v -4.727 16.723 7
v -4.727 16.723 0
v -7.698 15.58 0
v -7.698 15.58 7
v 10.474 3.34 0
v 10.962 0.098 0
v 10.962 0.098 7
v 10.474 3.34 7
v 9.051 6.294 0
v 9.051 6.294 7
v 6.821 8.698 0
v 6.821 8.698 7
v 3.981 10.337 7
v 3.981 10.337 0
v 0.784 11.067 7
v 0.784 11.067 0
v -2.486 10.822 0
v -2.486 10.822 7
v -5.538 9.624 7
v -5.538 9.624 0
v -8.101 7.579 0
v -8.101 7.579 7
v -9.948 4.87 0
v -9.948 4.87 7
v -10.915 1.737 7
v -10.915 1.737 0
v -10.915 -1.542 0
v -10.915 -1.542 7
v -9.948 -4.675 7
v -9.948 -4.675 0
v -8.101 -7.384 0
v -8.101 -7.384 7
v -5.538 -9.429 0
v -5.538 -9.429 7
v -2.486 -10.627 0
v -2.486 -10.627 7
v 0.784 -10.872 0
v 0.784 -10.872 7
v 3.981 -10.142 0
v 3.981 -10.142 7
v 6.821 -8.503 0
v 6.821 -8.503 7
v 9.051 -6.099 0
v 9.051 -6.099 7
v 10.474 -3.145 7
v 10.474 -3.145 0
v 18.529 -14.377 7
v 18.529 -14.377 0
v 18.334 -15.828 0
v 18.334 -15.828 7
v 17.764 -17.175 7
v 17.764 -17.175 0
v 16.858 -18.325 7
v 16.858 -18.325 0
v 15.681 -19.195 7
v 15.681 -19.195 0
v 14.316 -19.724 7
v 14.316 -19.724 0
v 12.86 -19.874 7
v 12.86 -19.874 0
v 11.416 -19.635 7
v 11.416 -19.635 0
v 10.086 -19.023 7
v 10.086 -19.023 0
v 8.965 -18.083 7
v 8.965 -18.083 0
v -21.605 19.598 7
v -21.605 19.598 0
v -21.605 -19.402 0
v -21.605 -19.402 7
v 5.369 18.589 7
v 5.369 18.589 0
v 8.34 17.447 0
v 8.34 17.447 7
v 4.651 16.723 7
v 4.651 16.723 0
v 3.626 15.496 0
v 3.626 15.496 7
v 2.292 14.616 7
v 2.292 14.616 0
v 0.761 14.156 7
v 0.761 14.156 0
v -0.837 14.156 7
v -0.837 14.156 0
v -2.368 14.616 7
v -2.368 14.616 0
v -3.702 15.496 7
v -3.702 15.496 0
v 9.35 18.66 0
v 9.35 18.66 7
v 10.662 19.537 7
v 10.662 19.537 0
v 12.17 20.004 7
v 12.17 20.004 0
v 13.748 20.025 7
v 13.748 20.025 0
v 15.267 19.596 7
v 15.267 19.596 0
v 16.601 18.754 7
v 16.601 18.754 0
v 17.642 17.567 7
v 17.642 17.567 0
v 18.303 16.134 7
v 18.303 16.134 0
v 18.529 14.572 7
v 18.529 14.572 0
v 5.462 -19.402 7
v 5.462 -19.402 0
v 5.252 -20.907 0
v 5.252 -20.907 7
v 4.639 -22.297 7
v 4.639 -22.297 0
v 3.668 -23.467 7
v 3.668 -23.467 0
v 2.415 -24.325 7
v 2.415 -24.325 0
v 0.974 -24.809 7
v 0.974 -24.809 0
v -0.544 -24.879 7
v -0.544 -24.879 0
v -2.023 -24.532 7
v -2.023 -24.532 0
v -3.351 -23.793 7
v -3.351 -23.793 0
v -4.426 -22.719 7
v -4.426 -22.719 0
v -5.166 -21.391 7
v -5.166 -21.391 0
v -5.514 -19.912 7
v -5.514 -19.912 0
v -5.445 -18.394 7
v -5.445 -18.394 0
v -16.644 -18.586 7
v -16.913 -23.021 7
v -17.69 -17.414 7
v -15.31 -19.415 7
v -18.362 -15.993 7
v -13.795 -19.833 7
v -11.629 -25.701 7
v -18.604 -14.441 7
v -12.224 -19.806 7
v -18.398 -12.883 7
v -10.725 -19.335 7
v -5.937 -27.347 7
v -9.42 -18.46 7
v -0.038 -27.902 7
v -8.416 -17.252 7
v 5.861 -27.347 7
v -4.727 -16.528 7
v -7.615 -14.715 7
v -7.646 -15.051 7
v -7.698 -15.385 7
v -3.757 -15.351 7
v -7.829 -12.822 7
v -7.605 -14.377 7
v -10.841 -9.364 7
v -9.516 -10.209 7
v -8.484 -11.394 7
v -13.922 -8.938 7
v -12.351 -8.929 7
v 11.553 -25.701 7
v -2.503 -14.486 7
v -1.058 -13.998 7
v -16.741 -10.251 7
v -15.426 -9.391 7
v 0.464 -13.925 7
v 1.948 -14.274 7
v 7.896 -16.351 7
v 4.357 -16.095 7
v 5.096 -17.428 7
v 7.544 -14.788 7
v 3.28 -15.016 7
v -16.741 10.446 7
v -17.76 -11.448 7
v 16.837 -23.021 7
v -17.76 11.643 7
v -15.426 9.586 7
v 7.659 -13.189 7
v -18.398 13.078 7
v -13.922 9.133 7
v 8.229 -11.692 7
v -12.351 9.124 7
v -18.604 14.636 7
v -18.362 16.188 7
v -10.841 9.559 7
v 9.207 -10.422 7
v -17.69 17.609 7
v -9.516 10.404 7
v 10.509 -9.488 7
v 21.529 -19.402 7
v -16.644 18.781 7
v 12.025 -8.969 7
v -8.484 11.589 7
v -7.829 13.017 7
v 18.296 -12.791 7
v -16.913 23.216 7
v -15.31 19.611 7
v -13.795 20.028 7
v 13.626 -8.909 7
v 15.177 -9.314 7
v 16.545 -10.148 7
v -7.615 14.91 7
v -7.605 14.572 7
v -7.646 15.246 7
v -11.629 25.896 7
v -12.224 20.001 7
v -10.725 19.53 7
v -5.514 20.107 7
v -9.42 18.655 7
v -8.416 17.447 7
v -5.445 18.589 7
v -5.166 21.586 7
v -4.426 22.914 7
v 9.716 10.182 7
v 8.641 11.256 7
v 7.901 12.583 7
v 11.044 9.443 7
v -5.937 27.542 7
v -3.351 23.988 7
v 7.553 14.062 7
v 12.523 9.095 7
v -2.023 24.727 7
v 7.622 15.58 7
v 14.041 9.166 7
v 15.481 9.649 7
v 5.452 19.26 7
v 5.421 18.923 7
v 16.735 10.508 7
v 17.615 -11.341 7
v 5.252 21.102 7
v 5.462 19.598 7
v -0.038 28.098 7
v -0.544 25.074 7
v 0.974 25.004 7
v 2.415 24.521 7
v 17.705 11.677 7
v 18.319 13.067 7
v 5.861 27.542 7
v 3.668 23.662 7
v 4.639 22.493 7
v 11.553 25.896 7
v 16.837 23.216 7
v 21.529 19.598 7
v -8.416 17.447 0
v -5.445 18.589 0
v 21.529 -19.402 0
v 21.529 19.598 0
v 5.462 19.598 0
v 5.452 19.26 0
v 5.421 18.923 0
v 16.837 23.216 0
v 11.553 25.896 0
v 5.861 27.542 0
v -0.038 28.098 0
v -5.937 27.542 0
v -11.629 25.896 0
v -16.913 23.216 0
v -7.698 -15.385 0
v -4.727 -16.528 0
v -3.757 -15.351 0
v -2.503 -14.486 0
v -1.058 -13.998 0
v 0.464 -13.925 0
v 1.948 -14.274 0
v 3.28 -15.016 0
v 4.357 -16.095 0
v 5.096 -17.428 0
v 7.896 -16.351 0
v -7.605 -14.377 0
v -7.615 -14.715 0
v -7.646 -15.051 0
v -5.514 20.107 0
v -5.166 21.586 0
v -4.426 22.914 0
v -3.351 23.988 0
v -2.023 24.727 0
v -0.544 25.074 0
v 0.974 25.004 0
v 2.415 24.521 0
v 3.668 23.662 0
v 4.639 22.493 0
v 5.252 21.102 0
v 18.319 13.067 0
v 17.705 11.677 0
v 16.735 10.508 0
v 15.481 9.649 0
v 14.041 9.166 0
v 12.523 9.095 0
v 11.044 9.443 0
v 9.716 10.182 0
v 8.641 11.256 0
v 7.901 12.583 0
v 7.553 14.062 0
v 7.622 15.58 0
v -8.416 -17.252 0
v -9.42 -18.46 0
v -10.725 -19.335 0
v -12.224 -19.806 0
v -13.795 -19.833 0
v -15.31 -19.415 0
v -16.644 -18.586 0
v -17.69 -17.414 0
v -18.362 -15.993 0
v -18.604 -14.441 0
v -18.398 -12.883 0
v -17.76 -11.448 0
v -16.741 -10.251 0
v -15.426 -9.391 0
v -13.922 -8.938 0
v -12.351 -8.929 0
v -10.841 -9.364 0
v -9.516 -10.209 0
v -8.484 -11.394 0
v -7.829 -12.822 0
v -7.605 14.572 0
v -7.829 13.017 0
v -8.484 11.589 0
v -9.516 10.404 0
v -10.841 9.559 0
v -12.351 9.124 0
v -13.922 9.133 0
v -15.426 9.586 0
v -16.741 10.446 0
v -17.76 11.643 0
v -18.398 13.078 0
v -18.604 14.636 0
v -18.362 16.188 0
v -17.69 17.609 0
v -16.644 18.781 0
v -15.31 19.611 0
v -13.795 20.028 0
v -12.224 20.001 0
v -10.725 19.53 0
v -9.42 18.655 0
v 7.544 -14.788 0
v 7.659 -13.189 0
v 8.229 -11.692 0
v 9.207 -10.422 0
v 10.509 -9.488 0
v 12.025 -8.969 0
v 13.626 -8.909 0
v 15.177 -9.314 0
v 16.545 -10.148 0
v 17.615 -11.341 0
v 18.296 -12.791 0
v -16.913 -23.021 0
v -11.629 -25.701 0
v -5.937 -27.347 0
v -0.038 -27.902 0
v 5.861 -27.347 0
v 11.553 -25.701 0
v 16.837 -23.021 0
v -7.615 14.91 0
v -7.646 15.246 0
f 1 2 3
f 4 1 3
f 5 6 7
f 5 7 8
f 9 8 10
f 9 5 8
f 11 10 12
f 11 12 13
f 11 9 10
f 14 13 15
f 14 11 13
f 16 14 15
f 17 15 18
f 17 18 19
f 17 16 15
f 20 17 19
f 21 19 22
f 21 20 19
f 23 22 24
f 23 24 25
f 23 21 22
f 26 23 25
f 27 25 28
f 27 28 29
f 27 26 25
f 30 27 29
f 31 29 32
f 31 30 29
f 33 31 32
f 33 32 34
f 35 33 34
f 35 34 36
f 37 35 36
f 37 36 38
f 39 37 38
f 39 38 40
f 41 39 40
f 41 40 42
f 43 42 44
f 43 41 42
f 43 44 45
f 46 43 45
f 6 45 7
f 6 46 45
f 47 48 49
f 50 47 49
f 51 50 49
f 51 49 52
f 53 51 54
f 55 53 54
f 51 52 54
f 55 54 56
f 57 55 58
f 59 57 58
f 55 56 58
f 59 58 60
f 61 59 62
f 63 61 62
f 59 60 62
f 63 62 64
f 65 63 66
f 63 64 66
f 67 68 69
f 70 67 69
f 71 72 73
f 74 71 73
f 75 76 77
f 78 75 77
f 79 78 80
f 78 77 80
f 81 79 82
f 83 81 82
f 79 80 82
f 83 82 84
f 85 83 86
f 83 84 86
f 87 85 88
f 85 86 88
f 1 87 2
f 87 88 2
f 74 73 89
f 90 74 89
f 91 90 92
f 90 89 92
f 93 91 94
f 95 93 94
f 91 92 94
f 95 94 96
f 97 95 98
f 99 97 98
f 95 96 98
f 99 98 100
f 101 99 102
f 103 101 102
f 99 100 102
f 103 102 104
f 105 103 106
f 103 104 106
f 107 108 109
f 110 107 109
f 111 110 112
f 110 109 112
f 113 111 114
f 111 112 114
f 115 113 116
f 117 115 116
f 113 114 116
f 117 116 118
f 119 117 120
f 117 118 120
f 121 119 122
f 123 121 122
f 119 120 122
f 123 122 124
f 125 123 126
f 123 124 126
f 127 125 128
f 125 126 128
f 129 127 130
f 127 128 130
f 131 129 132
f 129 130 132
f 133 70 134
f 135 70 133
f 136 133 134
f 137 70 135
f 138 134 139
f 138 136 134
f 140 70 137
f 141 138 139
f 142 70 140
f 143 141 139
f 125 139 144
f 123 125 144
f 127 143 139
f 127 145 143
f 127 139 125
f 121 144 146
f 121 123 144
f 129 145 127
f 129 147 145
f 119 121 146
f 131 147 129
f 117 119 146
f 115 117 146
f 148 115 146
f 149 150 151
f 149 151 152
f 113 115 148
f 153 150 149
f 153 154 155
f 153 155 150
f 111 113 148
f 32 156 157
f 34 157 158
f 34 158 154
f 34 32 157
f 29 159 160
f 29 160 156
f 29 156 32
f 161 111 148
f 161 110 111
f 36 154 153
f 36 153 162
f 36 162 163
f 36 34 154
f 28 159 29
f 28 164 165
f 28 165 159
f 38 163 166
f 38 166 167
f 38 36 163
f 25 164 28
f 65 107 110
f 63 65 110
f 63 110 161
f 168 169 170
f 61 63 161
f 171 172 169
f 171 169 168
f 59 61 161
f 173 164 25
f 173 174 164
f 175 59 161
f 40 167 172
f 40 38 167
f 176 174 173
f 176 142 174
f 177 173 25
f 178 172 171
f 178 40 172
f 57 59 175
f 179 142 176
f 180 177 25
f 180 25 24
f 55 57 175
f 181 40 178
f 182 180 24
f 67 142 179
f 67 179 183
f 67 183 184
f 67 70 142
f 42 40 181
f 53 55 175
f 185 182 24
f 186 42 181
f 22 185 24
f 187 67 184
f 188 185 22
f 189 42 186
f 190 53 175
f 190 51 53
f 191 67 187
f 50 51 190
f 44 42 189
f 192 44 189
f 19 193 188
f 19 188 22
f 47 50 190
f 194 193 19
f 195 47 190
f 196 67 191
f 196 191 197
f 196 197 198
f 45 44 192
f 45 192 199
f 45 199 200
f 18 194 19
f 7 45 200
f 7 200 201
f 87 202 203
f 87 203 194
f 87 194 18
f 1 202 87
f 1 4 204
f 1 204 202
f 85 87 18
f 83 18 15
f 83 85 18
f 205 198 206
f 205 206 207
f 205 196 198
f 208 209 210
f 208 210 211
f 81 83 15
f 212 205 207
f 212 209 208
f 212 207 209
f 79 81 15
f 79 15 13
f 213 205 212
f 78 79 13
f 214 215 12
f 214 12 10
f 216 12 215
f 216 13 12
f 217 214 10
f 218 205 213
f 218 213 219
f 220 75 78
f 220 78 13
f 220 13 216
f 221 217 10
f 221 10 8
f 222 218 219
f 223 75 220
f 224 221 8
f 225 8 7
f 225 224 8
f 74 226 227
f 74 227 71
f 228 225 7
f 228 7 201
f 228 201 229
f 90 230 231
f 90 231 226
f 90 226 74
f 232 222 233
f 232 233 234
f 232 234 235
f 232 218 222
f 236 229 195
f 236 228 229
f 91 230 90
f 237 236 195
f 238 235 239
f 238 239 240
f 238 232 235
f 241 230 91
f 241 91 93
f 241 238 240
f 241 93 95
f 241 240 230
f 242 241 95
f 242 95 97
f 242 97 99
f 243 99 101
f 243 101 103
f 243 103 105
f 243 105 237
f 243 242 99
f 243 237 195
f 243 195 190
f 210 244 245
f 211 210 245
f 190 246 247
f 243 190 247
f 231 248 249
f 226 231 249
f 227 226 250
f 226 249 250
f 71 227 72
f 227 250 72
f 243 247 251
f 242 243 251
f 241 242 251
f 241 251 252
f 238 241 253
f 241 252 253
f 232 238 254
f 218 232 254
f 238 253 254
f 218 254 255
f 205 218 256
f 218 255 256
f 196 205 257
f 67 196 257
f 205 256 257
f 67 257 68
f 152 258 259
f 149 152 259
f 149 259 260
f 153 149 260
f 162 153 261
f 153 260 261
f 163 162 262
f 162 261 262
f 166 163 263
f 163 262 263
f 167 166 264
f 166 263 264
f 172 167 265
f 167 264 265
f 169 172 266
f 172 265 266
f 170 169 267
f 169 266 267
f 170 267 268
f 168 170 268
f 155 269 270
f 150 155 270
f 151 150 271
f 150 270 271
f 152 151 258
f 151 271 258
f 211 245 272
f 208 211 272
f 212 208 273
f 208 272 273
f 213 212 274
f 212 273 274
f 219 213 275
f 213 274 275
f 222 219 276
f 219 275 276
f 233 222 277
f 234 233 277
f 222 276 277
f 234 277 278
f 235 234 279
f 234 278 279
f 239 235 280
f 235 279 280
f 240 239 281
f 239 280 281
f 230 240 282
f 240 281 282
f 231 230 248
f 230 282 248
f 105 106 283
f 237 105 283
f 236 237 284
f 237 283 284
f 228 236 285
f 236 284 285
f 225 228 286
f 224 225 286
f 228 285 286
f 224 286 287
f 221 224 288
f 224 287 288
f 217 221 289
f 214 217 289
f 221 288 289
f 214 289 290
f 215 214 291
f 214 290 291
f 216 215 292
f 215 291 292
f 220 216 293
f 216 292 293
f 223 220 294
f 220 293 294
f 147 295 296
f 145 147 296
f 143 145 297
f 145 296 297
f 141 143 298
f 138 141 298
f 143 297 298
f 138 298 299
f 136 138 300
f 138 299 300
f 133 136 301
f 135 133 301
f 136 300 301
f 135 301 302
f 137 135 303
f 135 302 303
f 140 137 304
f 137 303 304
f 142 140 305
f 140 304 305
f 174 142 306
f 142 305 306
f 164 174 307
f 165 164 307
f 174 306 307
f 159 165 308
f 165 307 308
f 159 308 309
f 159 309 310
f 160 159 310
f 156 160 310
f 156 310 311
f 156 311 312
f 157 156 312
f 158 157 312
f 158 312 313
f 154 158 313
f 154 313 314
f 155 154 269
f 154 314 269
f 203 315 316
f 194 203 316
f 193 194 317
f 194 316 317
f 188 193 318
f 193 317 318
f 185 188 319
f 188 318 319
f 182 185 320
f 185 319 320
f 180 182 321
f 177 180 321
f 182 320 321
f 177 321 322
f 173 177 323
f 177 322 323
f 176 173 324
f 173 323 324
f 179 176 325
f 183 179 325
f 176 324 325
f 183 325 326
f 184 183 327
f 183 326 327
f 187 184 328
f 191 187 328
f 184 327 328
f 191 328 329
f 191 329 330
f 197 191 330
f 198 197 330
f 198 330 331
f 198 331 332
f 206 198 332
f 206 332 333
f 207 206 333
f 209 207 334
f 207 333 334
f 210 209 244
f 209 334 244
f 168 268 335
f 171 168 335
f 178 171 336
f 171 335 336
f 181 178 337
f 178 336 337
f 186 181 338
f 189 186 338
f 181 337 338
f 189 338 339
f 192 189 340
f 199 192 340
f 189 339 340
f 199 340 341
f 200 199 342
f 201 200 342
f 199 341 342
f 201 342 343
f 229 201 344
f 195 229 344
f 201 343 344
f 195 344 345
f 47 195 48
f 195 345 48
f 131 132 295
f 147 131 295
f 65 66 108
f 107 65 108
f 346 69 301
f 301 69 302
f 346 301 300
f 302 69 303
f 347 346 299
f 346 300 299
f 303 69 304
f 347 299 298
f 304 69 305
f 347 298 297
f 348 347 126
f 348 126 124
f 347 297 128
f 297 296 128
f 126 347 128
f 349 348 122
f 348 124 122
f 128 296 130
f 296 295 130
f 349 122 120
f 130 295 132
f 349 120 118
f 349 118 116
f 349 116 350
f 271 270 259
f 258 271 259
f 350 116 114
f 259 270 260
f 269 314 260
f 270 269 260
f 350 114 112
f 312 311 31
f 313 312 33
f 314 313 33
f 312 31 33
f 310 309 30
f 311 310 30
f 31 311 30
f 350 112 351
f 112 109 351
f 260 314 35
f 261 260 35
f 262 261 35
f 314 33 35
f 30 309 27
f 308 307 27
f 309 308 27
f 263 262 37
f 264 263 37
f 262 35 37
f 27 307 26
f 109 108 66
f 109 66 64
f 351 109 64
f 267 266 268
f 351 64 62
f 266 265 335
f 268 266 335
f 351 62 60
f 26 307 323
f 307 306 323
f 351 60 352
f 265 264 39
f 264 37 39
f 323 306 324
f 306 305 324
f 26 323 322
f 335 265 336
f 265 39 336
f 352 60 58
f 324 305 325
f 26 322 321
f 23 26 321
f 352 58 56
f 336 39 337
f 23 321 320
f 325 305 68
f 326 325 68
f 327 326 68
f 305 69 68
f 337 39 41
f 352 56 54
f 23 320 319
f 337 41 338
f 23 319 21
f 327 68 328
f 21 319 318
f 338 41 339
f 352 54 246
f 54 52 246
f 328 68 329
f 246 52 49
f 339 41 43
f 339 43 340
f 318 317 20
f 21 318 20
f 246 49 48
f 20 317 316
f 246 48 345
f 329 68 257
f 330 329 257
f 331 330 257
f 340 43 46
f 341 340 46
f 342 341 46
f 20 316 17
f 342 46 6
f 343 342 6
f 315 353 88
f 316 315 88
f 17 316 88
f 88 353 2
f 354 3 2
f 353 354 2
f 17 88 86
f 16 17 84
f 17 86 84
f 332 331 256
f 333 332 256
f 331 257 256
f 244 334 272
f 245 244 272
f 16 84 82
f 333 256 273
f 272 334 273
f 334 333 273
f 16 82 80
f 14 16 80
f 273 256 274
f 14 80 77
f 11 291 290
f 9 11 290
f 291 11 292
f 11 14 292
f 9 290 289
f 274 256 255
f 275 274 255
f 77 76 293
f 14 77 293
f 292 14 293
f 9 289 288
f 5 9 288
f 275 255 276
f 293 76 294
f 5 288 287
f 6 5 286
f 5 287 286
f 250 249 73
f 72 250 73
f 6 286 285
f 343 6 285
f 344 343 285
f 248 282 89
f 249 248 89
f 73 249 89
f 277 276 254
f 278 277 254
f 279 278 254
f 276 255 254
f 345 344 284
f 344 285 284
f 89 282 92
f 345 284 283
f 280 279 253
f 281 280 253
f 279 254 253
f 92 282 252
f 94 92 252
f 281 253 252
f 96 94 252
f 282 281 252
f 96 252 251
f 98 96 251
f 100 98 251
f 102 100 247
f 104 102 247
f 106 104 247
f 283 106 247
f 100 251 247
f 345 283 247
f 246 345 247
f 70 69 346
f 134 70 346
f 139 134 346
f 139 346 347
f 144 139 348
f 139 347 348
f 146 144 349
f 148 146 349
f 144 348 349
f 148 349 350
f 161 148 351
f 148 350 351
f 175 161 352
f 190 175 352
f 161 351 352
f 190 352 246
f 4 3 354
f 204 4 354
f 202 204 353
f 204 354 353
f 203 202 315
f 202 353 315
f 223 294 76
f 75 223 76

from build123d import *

# Parameters (mm, degrees)
F0_R     = 11
F1_DEPTH = 7


with BuildPart() as f1:
    # F0 (on Top) → F1 (new body)
    with BuildSketch(Plane.XY):
        with BuildLine():
            ThreePointArc((21.529075, 19.597523), (-0.037789, 28.097523), (-21.604652, 19.597523))
            Line((-21.604652, 19.597523), (-21.604652, -19.402477))
            ThreePointArc((-21.604652, -19.402477), (-0.037789, -27.902477), (21.529075, -19.402477))
            Line((21.529075, -19.402477), (21.529075, 19.597523))
        make_face()
        with BuildLine():
            ThreePointArc((-8.415779, -17.251634), (-18.397988, -12.883317), (-7.604652, -14.376836))
            ThreePointArc((-7.604652, -14.376836), (-7.627996, -14.883036), (-7.69783, -15.384939))
            Line((-7.69783, -15.384939), (-4.726662, -16.527678))
            ThreePointArc((-4.726662, -16.527678), (0.464308, -13.925443), (5.095622, -17.428118))
            Line((5.095622, -17.428118), (7.895665, -16.351195))
            ThreePointArc((7.895665, -16.351195), (12.025023, -8.969259), (18.529075, -14.376836))
            ThreePointArc((18.529075, -14.376836), (15.016261, -19.505295), (8.965041, -18.082727))
            Line((8.965041, -18.082727), (5.462211, -19.402477))
            ThreePointArc((5.462211, -19.402477), (-0.543989, -24.879133), (-5.444611, -18.394373))
            Line((-5.444611, -18.394373), (-8.415779, -17.251634))
        make_face(mode=Mode.SUBTRACT)
        with Locations((-0.037789, 0.097523)):
            Circle(F0_R, mode=Mode.SUBTRACT)
        with BuildLine():
            ThreePointArc((8.340202, 17.446681), (14.522594, 19.865218), (18.529075, 14.571882))
            ThreePointArc((18.529075, 14.571882), (12.522875, 9.095226), (7.622253, 15.579986))
            Line((7.622253, 15.579986), (4.651085, 16.722725))
            ThreePointArc((4.651085, 16.722725), (-0.037789, 14.097523), (-4.726662, 16.722725))
            Line((-4.726662, 16.722725), (-7.69783, 15.579986))
            ThreePointArc((-7.69783, 15.579986), (-7.627996, 15.078083), (-7.604652, 14.571882))
            ThreePointArc((-7.604652, 14.571882), (-18.397988, 13.078364), (-8.415779, 17.446681))
            Line((-8.415779, 17.446681), (-5.444611, 18.58942))
            ThreePointArc((-5.444611, 18.58942), (-0.543989, 25.074179), (5.462211, 19.597523))
            ThreePointArc((5.462211, 19.597523), (5.438867, 19.091323), (5.369034, 18.58942))
            Line((5.369034, 18.58942), (8.340202, 17.446681))
        make_face(mode=Mode.SUBTRACT)
    extrude(amount=F1_DEPTH)


solid = f1.part
